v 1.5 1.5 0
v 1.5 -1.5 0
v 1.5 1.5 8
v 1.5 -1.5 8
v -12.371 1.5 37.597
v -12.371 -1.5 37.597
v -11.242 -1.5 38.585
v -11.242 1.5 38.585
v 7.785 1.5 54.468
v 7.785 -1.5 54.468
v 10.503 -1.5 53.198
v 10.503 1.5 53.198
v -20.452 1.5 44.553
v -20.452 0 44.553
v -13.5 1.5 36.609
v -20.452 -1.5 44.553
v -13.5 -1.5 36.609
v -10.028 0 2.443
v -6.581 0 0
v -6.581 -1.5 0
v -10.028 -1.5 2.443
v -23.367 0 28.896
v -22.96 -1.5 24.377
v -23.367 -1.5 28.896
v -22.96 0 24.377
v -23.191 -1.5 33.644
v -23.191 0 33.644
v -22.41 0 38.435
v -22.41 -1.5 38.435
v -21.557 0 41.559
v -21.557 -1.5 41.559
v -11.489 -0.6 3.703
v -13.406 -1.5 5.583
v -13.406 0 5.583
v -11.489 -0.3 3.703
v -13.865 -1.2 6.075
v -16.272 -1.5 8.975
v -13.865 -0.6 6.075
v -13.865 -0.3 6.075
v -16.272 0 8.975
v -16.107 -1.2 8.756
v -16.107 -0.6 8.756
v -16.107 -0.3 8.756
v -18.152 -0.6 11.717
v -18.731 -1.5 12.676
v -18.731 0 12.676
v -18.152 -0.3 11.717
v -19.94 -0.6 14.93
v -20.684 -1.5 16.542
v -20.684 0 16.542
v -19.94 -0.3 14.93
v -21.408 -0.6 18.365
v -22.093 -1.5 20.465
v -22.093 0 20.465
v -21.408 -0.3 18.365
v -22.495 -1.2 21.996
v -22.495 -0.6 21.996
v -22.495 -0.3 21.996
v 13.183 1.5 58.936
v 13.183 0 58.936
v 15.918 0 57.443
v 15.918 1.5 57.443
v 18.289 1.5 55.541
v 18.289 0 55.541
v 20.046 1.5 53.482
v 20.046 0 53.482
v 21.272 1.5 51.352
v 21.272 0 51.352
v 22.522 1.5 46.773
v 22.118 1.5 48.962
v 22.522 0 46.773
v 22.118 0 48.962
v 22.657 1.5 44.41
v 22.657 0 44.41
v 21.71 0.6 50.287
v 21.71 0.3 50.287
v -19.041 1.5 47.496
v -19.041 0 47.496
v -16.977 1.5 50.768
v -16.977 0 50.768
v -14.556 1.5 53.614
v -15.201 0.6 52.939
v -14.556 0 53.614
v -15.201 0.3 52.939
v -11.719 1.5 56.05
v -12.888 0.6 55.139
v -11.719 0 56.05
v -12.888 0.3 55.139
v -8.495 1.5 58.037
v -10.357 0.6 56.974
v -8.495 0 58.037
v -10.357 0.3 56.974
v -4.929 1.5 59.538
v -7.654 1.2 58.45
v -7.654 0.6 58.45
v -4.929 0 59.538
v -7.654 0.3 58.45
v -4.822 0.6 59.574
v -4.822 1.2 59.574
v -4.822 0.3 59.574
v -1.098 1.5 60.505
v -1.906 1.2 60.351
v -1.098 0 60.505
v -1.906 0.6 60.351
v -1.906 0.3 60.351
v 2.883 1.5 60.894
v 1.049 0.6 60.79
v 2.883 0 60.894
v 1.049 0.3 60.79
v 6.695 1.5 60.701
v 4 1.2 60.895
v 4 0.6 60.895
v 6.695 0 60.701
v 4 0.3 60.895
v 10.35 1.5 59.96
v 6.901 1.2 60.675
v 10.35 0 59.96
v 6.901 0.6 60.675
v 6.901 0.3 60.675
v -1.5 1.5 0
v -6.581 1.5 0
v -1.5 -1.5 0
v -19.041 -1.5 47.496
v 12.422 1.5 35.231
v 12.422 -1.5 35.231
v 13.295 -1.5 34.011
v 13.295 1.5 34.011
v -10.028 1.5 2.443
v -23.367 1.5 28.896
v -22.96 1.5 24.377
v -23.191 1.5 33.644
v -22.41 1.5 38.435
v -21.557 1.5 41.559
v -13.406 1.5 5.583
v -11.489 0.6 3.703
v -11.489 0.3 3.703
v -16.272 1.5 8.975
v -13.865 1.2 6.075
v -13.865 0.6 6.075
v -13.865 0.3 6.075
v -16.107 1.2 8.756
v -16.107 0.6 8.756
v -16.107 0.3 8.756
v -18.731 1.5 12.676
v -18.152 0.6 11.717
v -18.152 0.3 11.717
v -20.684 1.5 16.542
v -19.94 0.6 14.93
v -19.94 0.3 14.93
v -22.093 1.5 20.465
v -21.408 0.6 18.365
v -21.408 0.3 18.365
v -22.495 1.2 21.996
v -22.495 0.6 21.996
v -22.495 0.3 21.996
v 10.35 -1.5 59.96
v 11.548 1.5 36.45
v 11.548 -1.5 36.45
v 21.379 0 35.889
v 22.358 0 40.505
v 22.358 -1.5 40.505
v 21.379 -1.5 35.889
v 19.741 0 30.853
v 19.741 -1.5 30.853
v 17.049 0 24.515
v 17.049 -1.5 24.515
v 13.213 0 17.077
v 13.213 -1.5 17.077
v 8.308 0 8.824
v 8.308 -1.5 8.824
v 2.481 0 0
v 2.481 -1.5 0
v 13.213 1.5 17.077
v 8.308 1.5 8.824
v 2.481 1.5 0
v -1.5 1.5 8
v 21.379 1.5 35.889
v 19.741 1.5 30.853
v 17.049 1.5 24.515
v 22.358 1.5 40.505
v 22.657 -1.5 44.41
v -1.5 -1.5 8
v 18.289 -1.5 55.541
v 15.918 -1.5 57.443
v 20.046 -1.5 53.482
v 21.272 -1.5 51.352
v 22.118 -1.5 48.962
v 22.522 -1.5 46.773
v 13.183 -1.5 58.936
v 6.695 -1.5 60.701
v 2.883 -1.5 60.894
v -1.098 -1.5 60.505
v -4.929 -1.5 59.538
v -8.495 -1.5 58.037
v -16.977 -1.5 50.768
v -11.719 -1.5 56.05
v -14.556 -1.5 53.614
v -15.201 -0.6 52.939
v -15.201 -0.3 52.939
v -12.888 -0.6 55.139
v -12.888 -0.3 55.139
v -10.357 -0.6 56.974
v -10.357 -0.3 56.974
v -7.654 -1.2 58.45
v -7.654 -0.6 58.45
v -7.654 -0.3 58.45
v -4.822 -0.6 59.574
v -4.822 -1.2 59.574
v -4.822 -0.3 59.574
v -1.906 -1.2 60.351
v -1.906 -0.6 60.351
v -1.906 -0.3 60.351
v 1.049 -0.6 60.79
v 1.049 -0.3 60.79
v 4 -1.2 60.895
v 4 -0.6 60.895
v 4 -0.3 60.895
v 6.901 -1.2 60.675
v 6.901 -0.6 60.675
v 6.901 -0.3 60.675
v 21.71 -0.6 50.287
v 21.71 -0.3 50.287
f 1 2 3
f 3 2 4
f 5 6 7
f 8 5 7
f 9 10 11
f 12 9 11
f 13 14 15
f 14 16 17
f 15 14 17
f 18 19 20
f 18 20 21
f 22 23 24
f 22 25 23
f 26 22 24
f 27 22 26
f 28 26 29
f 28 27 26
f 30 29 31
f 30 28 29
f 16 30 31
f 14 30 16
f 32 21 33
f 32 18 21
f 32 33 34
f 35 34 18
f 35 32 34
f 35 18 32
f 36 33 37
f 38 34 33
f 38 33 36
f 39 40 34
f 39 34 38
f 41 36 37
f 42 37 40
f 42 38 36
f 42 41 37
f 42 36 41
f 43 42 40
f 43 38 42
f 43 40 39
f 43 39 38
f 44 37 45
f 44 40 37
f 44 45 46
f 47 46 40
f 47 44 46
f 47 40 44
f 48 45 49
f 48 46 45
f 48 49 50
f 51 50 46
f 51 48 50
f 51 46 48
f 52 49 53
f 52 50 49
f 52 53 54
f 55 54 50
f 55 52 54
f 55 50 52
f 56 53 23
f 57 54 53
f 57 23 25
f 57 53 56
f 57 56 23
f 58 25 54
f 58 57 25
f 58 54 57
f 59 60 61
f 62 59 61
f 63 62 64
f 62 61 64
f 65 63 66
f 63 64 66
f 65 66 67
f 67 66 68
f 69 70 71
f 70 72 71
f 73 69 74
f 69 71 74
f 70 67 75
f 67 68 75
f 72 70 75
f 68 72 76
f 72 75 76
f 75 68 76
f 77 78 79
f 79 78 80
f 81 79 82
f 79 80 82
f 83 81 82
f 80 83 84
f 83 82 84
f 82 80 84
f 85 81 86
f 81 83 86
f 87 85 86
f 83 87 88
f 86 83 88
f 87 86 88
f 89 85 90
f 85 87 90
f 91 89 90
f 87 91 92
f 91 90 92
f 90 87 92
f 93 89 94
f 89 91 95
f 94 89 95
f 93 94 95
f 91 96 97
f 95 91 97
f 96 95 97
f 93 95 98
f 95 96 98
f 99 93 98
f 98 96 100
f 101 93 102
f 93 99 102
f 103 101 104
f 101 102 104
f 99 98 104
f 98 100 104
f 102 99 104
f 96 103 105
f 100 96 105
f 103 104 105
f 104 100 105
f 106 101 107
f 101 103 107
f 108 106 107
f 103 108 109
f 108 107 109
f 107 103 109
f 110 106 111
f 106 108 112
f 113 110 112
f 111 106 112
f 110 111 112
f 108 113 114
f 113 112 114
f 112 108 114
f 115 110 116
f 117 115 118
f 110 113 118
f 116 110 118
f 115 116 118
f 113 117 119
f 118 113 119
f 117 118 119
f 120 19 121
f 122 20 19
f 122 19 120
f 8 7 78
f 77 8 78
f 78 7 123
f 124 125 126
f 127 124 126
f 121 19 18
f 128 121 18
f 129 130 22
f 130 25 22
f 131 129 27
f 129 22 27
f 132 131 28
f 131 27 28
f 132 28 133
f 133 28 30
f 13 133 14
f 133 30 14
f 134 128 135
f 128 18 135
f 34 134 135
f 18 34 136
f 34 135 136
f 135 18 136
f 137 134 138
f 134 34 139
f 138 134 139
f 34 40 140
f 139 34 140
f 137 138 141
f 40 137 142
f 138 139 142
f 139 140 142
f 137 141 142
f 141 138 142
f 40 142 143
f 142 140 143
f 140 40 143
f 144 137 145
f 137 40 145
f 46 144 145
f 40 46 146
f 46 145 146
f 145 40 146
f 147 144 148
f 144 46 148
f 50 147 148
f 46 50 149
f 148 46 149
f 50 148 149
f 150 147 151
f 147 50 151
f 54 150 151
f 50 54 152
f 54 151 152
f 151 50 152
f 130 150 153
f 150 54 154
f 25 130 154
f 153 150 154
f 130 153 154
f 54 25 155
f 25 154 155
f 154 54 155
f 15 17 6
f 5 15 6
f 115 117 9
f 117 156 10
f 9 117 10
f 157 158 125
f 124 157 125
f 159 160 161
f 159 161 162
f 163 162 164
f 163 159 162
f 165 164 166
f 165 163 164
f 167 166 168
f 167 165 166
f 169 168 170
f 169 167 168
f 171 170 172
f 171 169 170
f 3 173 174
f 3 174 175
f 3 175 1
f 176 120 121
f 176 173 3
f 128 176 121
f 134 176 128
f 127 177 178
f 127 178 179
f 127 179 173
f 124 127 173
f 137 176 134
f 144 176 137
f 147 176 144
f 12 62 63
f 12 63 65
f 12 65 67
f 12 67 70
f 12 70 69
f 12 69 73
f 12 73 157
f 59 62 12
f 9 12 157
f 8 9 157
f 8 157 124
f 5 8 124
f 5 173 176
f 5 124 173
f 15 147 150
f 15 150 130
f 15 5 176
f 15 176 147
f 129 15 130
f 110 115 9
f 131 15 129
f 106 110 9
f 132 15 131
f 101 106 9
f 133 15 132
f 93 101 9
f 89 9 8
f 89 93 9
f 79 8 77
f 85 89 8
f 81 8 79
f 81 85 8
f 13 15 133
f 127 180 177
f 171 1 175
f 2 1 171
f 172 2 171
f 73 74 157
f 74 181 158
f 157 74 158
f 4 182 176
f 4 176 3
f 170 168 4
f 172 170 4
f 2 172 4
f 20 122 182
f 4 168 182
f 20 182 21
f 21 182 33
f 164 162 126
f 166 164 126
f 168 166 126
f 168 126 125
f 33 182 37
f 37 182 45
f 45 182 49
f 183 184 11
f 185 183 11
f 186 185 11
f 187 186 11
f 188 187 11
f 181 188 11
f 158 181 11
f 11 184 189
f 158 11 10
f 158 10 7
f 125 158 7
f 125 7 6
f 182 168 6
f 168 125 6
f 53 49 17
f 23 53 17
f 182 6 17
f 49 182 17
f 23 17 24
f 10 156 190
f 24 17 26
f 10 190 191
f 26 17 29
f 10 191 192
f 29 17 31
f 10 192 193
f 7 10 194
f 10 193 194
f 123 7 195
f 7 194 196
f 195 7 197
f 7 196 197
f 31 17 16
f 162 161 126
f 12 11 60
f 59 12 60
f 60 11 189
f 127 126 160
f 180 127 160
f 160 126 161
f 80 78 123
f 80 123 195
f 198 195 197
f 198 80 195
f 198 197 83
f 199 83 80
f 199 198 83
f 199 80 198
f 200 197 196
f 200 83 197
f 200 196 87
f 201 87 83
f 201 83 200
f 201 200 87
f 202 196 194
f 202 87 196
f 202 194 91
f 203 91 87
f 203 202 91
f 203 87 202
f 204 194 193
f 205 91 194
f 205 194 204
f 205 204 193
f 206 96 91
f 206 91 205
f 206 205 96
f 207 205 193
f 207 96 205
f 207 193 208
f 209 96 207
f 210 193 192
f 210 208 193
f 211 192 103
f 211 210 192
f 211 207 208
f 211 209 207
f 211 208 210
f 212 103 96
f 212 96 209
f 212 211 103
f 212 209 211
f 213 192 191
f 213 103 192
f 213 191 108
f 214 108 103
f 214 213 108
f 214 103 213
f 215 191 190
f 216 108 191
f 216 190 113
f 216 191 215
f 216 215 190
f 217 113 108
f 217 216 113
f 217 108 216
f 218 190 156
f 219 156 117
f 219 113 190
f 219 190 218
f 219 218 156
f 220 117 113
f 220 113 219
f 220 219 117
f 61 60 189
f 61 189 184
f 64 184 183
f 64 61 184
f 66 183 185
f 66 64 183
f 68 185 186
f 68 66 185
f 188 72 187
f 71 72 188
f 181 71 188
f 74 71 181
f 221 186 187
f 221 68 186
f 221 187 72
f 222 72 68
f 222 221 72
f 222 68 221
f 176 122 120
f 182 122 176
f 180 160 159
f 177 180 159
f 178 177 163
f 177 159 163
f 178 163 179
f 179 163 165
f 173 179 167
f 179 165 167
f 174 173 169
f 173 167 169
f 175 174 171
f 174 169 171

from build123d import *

# Parameters (mm, degrees)
F2_DEPTH = 1.5
F3_W     = 3
F3_H     = 16
F4_DEPTH = 25


with BuildPart() as f2:
    # F1 (on Front) → F2 (new body, symmetric)
    with BuildSketch(Plane.XZ):
        with BuildLine():
            add(Edge.make_bspline(
                [(-6.5811700188, 0), (-13.0977069694, 3.9364622169), (-27.8054503735, 20.8943752102), (-19.4177727212, 56.5137920169), (6.8547689493, 63.7937351975), (29.7863310593, 50.168239492), (17.9522950202, 22.4377531558), (2.4807401933, 0)],
                knots=[0, 0, 0, 0, 0.1910098898, 0.3977067511, 0.5751034644, 0.7310175316, 1, 1, 1, 1], degree=3))
            Line((-6.5811700188, 0), (2.4807401933, 0))
        make_face()
    extrude(amount=F2_DEPTH, both=True)

    # F3 (on face) → F4 (cut)
    with BuildSketch(Plane.XZ.offset(1.5)):
        Polygon((-27.1802046987, 54.5183615733), (-28.3089713791, 53.5304922594), (-13.4995171291, 36.6088020352), (-12.3707504488, 37.5966713491), (-11.2419837684, 38.584540663), (-26.0514380184, 55.5062308872), align=None)
        Polygon((9.1437500469, 53.8333112983), (10.5027554102, 53.1984062483), (15.7936308269, 64.5234509425), (14.4346254636, 65.1583559925), (13.0756201003, 65.7932610425), (7.7847446836, 54.4682163483), align=None)
        Polygon((13.2953272893, 34.0113688736), (33.6170477787, 48.572539031), (32.7433775692, 49.7918422604), (31.8697073598, 51.0111454897), (11.5479868704, 36.4499753323), (12.4216570799, 35.2306721029), align=None)
        Rectangle(F3_W, F3_H)
    extrude(amount=-F4_DEPTH, mode=Mode.SUBTRACT)


solid = f2.part
